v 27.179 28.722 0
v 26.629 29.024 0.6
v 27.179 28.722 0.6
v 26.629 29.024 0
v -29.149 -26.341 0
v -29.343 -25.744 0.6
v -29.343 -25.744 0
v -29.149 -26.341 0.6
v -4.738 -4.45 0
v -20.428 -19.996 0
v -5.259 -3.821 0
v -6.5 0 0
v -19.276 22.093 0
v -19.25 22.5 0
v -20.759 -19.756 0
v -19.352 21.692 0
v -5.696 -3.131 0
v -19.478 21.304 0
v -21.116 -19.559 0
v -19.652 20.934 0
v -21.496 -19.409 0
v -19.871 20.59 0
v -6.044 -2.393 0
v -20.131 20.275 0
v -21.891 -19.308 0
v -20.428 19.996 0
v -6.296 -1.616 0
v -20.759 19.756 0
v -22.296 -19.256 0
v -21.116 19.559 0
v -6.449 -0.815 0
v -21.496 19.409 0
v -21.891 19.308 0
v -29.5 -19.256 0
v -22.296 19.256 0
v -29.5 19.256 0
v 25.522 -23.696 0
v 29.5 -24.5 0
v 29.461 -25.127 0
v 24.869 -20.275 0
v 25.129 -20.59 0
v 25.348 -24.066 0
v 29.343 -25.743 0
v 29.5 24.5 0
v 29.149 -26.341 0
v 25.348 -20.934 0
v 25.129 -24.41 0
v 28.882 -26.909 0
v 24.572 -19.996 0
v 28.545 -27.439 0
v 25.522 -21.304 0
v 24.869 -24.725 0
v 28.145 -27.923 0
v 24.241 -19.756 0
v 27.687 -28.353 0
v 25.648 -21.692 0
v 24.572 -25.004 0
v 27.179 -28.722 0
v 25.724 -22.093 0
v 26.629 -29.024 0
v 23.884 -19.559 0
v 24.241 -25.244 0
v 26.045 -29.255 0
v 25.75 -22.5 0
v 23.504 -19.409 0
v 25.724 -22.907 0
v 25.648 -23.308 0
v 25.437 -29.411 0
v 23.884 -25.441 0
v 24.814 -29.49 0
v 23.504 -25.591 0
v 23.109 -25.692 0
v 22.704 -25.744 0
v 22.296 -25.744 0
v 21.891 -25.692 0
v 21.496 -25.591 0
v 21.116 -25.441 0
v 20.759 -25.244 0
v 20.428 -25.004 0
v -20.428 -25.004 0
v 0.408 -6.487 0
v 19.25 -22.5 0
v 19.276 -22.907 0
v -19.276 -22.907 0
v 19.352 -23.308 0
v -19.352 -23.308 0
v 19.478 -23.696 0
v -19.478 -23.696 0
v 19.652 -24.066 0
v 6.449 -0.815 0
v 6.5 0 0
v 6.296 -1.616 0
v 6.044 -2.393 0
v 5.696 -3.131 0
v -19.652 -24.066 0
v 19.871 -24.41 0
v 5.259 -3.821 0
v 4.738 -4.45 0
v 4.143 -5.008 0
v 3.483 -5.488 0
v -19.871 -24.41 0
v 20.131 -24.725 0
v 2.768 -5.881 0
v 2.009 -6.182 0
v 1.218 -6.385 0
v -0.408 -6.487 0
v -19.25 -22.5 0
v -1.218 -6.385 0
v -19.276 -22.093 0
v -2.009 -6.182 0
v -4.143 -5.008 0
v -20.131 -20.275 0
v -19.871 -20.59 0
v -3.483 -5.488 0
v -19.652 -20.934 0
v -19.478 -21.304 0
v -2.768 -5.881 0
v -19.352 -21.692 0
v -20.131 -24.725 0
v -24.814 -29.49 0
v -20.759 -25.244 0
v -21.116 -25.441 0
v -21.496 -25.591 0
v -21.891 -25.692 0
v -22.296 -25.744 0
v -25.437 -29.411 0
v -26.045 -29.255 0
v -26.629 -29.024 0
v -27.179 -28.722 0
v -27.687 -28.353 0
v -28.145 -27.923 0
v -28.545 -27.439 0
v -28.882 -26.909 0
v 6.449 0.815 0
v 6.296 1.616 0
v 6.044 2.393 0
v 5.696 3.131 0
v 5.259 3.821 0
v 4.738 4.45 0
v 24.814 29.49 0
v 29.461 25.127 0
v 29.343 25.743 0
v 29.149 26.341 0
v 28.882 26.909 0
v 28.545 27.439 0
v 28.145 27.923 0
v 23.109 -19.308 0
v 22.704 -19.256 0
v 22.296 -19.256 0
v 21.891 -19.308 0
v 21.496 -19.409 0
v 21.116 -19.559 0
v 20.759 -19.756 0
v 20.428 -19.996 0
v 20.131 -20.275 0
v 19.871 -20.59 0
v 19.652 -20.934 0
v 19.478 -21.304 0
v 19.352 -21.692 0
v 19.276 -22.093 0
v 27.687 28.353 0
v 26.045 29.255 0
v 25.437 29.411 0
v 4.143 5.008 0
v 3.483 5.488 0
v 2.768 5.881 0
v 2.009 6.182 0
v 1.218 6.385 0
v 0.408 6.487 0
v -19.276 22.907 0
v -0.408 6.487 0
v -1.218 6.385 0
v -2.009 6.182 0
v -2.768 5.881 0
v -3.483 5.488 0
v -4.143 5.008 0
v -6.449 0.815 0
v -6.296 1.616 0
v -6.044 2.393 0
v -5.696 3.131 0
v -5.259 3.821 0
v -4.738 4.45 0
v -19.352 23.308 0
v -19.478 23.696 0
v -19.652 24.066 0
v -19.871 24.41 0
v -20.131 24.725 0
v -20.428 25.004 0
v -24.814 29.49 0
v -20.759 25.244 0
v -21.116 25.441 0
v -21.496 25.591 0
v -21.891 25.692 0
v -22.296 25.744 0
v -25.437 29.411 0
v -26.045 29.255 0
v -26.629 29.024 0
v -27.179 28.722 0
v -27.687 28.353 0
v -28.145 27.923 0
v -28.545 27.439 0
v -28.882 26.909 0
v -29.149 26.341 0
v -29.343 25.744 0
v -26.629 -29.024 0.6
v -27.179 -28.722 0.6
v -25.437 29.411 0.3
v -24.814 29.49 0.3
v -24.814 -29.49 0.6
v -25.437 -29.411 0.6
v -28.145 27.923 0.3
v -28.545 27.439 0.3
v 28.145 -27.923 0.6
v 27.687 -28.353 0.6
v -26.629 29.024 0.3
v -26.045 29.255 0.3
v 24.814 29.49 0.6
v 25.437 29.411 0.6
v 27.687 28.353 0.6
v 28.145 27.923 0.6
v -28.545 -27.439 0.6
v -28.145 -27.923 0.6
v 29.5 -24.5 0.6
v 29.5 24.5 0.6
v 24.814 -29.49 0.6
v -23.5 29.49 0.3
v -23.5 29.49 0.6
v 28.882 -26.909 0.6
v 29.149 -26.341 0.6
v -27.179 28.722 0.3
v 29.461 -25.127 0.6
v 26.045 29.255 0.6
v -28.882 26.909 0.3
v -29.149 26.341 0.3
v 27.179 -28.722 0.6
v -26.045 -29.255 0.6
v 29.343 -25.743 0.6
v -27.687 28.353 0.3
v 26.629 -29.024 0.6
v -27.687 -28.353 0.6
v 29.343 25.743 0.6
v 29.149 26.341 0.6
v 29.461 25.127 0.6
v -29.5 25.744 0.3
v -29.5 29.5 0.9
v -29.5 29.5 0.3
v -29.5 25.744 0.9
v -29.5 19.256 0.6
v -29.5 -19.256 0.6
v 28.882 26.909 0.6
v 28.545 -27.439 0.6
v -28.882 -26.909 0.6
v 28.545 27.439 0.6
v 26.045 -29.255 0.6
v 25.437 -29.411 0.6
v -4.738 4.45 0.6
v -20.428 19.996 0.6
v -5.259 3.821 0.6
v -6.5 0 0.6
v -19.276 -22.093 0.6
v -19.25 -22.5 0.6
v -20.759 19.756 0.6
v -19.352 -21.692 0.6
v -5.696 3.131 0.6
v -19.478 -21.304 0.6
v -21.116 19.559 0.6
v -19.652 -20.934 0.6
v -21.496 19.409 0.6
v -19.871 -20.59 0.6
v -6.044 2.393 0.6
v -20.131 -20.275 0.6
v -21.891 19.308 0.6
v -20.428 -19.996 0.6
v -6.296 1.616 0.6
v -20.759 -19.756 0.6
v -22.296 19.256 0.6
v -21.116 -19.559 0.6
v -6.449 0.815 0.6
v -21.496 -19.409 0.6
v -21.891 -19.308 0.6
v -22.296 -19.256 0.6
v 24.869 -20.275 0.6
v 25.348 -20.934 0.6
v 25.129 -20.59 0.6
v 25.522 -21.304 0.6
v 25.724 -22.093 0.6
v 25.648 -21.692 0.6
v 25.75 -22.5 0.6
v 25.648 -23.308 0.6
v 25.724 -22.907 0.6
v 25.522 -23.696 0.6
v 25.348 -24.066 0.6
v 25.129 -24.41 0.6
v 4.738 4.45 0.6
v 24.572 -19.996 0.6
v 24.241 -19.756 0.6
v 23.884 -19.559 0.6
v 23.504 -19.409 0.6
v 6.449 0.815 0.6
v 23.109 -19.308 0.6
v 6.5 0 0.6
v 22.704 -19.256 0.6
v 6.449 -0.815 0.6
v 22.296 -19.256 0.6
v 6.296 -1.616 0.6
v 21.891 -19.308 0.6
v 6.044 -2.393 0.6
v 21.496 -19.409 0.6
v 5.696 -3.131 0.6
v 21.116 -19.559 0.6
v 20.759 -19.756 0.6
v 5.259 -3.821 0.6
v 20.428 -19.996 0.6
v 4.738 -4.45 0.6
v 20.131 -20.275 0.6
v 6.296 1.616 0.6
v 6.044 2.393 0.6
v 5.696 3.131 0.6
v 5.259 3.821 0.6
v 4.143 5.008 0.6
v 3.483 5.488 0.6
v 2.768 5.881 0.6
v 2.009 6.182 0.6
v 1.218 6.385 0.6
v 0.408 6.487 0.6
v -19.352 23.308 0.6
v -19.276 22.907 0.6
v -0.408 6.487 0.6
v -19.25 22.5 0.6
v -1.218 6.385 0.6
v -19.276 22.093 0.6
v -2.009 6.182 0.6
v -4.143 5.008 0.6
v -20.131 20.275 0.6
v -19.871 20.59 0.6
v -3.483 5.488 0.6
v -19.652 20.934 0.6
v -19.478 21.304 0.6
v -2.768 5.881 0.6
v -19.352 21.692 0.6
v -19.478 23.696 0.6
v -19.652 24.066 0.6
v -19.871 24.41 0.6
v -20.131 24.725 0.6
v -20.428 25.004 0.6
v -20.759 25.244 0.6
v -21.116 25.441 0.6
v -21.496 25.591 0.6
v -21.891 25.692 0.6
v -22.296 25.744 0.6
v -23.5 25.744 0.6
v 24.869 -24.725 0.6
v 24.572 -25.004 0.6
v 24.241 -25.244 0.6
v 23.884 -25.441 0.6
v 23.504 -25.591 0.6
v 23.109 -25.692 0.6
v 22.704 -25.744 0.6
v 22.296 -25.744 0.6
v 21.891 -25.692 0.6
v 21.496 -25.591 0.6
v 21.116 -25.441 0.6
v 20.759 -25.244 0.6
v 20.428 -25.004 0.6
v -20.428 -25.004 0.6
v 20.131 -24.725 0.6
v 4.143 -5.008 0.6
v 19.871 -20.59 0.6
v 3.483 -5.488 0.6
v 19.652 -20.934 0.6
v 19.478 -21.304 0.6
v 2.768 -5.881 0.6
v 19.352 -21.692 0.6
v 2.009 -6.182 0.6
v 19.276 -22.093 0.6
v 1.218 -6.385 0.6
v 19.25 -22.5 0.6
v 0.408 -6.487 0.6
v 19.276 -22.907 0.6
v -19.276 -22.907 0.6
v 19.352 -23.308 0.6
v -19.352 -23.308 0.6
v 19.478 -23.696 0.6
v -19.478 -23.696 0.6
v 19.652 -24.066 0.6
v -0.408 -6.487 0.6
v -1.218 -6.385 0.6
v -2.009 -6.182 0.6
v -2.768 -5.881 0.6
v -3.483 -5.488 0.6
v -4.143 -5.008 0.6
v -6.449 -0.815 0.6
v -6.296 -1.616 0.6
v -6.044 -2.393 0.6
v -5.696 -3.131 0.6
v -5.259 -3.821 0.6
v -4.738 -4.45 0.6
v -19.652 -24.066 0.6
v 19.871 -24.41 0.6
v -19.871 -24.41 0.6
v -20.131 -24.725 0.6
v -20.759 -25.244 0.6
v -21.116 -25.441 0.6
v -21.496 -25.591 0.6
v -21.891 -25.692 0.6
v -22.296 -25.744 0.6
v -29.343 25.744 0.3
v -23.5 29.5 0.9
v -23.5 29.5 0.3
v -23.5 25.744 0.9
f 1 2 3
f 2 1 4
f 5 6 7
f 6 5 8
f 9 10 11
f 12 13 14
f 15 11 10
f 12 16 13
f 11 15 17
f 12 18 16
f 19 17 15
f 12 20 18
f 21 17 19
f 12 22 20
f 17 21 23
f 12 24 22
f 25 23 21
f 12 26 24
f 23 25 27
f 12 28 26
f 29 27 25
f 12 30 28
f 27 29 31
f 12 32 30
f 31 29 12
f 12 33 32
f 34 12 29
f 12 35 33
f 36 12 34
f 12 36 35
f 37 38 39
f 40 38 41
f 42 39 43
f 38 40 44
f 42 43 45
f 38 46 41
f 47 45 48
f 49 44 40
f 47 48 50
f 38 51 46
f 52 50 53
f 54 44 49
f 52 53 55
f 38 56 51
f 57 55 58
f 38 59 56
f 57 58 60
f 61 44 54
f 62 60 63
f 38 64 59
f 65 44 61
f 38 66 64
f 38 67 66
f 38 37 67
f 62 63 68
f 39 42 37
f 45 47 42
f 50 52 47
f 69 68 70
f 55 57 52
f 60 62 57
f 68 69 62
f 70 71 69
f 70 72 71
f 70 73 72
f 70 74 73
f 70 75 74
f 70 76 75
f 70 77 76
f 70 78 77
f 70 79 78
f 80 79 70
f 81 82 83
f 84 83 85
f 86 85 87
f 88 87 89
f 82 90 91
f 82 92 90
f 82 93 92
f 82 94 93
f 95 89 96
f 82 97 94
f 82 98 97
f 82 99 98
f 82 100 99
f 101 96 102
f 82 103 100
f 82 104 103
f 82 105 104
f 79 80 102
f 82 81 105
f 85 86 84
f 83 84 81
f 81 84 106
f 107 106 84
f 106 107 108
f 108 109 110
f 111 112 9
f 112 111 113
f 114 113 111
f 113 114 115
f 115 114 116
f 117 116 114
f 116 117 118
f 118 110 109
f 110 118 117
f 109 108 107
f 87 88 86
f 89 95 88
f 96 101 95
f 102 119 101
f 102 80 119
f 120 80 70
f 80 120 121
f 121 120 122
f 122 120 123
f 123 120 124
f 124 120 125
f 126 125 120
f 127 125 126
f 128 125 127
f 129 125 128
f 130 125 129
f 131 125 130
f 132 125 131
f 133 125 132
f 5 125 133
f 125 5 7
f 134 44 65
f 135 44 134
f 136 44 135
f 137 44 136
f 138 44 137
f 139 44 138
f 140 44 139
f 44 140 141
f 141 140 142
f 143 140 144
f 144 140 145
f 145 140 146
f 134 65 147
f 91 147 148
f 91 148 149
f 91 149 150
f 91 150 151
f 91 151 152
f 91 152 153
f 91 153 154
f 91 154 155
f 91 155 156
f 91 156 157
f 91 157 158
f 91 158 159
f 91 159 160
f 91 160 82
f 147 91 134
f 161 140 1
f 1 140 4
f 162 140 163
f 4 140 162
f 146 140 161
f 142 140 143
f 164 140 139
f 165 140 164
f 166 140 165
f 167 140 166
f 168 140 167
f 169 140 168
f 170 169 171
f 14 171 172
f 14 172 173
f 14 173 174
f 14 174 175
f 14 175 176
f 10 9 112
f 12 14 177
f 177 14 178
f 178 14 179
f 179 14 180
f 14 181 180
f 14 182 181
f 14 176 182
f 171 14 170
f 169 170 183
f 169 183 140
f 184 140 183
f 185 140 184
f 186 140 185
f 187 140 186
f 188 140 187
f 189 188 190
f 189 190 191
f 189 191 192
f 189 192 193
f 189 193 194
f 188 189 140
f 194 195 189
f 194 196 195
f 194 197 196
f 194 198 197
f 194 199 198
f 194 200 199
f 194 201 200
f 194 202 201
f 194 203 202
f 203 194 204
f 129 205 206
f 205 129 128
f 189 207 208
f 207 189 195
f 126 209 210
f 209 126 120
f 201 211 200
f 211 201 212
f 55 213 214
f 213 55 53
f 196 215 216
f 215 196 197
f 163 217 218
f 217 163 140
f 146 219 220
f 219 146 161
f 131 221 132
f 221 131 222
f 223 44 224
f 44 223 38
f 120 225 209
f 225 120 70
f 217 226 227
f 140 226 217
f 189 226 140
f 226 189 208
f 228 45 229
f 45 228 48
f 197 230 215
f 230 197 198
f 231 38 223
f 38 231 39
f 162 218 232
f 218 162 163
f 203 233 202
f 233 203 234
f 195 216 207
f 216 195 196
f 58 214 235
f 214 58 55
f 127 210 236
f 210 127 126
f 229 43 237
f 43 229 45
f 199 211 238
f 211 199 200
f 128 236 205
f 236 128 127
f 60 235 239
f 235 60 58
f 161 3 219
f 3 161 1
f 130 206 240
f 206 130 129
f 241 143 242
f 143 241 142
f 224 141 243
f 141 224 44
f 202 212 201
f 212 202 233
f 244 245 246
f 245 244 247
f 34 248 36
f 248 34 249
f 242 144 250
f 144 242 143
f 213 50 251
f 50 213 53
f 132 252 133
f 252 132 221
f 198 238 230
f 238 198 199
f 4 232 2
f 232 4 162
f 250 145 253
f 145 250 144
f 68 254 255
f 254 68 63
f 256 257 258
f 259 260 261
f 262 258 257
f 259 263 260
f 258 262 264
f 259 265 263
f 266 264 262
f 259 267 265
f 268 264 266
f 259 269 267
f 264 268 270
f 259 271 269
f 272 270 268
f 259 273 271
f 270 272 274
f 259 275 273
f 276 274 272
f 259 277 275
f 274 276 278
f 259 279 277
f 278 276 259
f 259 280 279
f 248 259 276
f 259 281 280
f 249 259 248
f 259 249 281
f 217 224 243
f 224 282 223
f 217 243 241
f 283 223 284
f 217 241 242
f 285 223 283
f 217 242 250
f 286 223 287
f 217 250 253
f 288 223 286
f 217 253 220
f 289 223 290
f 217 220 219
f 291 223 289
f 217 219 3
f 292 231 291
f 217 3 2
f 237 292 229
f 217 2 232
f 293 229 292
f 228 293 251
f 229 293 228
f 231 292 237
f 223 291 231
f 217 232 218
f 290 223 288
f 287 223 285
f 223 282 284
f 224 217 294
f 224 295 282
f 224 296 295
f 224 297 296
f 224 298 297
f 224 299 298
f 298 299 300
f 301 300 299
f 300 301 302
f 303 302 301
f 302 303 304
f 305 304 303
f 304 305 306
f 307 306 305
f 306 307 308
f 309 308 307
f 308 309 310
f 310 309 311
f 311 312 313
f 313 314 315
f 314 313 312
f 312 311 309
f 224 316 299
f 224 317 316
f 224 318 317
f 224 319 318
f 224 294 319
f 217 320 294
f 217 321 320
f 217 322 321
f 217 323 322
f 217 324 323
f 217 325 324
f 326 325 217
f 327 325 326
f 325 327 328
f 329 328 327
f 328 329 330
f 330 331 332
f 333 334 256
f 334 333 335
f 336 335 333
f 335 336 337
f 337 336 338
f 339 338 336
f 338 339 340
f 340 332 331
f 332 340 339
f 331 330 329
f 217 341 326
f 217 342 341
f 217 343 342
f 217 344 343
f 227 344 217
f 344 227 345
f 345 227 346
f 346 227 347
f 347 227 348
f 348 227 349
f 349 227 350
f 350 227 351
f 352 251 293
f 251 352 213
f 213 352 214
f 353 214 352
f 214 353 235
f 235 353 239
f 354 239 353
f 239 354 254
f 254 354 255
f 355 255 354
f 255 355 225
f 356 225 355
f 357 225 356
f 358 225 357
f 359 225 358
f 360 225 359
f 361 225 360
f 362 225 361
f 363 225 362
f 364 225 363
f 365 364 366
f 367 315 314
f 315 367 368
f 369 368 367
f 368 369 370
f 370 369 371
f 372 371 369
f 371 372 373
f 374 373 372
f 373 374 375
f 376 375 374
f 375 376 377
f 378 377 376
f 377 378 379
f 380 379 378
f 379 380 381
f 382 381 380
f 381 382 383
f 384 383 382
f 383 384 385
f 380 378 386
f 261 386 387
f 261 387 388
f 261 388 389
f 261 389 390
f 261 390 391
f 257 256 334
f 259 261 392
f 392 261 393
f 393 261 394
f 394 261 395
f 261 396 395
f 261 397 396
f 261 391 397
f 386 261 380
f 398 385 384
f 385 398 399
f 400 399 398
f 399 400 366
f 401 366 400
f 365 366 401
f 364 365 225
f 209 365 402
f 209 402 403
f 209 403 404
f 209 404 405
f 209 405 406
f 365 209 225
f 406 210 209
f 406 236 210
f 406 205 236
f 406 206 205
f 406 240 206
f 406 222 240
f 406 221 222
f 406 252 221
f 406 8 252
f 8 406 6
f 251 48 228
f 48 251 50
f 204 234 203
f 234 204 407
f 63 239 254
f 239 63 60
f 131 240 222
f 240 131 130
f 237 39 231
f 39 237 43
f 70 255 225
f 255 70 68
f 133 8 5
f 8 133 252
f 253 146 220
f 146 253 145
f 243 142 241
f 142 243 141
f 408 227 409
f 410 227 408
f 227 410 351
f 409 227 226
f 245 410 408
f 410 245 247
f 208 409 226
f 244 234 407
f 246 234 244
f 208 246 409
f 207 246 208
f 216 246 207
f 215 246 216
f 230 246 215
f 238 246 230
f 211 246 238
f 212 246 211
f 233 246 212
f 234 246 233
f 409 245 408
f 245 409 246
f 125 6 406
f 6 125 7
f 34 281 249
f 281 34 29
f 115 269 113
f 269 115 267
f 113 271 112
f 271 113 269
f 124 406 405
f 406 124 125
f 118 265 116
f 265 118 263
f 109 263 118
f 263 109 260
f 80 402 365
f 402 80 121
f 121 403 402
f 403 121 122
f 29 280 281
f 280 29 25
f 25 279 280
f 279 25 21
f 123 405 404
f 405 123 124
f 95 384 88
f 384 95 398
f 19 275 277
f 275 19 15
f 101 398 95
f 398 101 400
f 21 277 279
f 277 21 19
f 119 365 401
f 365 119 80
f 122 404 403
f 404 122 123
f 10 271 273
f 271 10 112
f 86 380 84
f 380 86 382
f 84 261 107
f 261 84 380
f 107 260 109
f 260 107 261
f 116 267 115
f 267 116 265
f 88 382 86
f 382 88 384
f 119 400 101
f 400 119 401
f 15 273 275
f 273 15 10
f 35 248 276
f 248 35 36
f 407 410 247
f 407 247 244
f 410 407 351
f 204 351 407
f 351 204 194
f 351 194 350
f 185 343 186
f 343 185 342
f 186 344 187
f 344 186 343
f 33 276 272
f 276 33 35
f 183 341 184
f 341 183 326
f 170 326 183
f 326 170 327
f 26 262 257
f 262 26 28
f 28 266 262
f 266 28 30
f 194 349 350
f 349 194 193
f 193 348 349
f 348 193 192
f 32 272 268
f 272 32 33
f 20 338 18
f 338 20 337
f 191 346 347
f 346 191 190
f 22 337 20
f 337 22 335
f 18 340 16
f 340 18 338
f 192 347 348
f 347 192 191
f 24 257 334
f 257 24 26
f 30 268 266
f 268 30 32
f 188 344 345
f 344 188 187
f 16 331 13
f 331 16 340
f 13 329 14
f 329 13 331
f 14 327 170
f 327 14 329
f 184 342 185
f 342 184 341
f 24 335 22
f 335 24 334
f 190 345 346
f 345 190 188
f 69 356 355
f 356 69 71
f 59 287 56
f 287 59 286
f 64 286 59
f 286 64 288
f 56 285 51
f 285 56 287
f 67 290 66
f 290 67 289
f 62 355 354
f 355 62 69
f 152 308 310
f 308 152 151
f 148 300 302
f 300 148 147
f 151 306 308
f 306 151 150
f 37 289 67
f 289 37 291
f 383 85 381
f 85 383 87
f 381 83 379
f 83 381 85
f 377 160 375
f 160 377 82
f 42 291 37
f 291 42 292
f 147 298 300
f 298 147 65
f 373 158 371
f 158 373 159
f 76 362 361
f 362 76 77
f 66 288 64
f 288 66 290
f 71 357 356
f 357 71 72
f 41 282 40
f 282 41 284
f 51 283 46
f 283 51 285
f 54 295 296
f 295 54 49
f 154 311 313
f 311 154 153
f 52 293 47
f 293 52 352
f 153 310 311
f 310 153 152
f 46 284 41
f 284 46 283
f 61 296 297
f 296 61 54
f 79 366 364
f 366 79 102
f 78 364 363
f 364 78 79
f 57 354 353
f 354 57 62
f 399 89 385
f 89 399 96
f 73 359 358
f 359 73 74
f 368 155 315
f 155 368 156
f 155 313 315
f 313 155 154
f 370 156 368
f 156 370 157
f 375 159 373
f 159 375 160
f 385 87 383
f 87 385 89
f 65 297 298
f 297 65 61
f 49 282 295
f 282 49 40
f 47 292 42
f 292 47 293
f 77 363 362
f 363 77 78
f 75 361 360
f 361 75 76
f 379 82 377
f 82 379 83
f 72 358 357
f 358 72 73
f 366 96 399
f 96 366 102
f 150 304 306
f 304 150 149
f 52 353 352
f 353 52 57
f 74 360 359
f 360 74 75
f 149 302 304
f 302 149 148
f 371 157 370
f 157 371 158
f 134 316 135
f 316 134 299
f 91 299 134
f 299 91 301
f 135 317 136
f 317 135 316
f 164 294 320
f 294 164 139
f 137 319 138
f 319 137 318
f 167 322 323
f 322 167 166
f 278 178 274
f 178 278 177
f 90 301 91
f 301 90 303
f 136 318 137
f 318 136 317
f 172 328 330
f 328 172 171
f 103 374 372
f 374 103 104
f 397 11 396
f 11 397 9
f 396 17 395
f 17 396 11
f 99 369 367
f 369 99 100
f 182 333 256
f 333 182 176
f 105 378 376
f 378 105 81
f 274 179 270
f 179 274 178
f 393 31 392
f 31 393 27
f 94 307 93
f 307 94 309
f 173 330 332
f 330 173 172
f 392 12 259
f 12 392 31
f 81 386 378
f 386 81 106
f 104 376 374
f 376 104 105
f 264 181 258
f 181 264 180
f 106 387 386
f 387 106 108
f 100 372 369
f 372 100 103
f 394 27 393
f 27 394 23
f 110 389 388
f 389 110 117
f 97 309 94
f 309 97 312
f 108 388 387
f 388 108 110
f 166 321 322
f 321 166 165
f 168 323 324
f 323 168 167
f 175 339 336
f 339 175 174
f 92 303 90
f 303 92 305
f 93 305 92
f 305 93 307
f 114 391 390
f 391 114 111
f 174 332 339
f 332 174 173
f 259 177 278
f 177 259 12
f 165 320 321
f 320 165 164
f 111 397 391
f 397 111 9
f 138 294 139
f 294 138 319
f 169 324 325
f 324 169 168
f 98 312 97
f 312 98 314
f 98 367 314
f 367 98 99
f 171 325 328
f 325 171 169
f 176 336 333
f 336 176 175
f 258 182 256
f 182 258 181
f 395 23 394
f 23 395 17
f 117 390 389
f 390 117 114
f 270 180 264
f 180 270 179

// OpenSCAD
$fn = 50;


difference() {
	union() {
		translate(v = [0, 0, 0]) {
			rotate(a = [0, 0, 0]) {
				hull() {
					translate(v = [-24.5000000000, 24.5000000000, 0]) {
						rotate(a = [0, 0, 0]) {
							translate(v = [0, 0, 0]) {
								rotate(a = [0, 0, 0]) {
									cylinder(h = 0.6000000000, r = 5);
								}
							}
						}
					}
					translate(v = [24.5000000000, 24.5000000000, 0]) {
						rotate(a = [0, 0, 0]) {
							translate(v = [0, 0, 0]) {
								rotate(a = [0, 0, 0]) {
									cylinder(h = 0.6000000000, r = 5);
								}
							}
						}
					}
					translate(v = [-24.5000000000, -24.5000000000, 0]) {
						rotate(a = [0, 0, 0]) {
							translate(v = [0, 0, 0]) {
								rotate(a = [0, 0, 0]) {
									cylinder(h = 0.6000000000, r = 5);
								}
							}
						}
					}
					translate(v = [24.5000000000, -24.5000000000, 0]) {
						rotate(a = [0, 0, 0]) {
							translate(v = [0, 0, 0]) {
								rotate(a = [0, 0, 0]) {
									cylinder(h = 0.6000000000, r = 5);
								}
							}
						}
					}
				}
			}
		}
		#translate(v = [-29.5000000000, 23.5000000000, 0.3000000000]) {
			rotate(a = [0, 0, 0]) {
				cube(size = [6, 6, 0.6000000000]);
			}
		}
	}
	union() {
		translate(v = [-30.0000000000, -22.5000000000, -125]) {
			rotate(a = [0, 0, 0]) {
				hull() {
					translate(v = [7.5000000000, 0, 0]) {
						rotate(a = [0, 0, 0]) {
							translate(v = [0, 0, 0]) {
								rotate(a = [0, 0, 0]) {
									cylinder(h = 250, r = 3.2500000000);
								}
							}
						}
					}
					translate(v = [-7.5000000000, 0, 0]) {
						rotate(a = [0, 0, 0]) {
							translate(v = [0, 0, 0]) {
								rotate(a = [0, 0, 0]) {
									cylinder(h = 250, r = 3.2500000000);
								}
							}
						}
					}
				}
			}
		}
		translate(v = [-30.0000000000, 22.5000000000, -125]) {
			rotate(a = [0, 0, 0]) {
				hull() {
					translate(v = [7.5000000000, 0, 0]) {
						rotate(a = [0, 0, 0]) {
							translate(v = [0, 0, 0]) {
								rotate(a = [0, 0, 0]) {
									cylinder(h = 250, r = 3.2500000000);
								}
							}
						}
					}
					translate(v = [-7.5000000000, 0, 0]) {
						rotate(a = [0, 0, 0]) {
							translate(v = [0, 0, 0]) {
								rotate(a = [0, 0, 0]) {
									cylinder(h = 250, r = 3.2500000000);
								}
							}
						}
					}
				}
			}
		}
		translate(v = [22.5000000000, -22.5000000000, -125.0000000000]) {
			rotate(a = [0, 0, 0]) {
				cylinder(h = 250, r = 3.2500000000);
			}
		}
		translate(v = [0, 0, 0.0000000000]) {
			rotate(a = [0, 0, 0]) {
				cylinder(h = 0.6000000000, r = 6.5000000000);
			}
		}
	}
}
